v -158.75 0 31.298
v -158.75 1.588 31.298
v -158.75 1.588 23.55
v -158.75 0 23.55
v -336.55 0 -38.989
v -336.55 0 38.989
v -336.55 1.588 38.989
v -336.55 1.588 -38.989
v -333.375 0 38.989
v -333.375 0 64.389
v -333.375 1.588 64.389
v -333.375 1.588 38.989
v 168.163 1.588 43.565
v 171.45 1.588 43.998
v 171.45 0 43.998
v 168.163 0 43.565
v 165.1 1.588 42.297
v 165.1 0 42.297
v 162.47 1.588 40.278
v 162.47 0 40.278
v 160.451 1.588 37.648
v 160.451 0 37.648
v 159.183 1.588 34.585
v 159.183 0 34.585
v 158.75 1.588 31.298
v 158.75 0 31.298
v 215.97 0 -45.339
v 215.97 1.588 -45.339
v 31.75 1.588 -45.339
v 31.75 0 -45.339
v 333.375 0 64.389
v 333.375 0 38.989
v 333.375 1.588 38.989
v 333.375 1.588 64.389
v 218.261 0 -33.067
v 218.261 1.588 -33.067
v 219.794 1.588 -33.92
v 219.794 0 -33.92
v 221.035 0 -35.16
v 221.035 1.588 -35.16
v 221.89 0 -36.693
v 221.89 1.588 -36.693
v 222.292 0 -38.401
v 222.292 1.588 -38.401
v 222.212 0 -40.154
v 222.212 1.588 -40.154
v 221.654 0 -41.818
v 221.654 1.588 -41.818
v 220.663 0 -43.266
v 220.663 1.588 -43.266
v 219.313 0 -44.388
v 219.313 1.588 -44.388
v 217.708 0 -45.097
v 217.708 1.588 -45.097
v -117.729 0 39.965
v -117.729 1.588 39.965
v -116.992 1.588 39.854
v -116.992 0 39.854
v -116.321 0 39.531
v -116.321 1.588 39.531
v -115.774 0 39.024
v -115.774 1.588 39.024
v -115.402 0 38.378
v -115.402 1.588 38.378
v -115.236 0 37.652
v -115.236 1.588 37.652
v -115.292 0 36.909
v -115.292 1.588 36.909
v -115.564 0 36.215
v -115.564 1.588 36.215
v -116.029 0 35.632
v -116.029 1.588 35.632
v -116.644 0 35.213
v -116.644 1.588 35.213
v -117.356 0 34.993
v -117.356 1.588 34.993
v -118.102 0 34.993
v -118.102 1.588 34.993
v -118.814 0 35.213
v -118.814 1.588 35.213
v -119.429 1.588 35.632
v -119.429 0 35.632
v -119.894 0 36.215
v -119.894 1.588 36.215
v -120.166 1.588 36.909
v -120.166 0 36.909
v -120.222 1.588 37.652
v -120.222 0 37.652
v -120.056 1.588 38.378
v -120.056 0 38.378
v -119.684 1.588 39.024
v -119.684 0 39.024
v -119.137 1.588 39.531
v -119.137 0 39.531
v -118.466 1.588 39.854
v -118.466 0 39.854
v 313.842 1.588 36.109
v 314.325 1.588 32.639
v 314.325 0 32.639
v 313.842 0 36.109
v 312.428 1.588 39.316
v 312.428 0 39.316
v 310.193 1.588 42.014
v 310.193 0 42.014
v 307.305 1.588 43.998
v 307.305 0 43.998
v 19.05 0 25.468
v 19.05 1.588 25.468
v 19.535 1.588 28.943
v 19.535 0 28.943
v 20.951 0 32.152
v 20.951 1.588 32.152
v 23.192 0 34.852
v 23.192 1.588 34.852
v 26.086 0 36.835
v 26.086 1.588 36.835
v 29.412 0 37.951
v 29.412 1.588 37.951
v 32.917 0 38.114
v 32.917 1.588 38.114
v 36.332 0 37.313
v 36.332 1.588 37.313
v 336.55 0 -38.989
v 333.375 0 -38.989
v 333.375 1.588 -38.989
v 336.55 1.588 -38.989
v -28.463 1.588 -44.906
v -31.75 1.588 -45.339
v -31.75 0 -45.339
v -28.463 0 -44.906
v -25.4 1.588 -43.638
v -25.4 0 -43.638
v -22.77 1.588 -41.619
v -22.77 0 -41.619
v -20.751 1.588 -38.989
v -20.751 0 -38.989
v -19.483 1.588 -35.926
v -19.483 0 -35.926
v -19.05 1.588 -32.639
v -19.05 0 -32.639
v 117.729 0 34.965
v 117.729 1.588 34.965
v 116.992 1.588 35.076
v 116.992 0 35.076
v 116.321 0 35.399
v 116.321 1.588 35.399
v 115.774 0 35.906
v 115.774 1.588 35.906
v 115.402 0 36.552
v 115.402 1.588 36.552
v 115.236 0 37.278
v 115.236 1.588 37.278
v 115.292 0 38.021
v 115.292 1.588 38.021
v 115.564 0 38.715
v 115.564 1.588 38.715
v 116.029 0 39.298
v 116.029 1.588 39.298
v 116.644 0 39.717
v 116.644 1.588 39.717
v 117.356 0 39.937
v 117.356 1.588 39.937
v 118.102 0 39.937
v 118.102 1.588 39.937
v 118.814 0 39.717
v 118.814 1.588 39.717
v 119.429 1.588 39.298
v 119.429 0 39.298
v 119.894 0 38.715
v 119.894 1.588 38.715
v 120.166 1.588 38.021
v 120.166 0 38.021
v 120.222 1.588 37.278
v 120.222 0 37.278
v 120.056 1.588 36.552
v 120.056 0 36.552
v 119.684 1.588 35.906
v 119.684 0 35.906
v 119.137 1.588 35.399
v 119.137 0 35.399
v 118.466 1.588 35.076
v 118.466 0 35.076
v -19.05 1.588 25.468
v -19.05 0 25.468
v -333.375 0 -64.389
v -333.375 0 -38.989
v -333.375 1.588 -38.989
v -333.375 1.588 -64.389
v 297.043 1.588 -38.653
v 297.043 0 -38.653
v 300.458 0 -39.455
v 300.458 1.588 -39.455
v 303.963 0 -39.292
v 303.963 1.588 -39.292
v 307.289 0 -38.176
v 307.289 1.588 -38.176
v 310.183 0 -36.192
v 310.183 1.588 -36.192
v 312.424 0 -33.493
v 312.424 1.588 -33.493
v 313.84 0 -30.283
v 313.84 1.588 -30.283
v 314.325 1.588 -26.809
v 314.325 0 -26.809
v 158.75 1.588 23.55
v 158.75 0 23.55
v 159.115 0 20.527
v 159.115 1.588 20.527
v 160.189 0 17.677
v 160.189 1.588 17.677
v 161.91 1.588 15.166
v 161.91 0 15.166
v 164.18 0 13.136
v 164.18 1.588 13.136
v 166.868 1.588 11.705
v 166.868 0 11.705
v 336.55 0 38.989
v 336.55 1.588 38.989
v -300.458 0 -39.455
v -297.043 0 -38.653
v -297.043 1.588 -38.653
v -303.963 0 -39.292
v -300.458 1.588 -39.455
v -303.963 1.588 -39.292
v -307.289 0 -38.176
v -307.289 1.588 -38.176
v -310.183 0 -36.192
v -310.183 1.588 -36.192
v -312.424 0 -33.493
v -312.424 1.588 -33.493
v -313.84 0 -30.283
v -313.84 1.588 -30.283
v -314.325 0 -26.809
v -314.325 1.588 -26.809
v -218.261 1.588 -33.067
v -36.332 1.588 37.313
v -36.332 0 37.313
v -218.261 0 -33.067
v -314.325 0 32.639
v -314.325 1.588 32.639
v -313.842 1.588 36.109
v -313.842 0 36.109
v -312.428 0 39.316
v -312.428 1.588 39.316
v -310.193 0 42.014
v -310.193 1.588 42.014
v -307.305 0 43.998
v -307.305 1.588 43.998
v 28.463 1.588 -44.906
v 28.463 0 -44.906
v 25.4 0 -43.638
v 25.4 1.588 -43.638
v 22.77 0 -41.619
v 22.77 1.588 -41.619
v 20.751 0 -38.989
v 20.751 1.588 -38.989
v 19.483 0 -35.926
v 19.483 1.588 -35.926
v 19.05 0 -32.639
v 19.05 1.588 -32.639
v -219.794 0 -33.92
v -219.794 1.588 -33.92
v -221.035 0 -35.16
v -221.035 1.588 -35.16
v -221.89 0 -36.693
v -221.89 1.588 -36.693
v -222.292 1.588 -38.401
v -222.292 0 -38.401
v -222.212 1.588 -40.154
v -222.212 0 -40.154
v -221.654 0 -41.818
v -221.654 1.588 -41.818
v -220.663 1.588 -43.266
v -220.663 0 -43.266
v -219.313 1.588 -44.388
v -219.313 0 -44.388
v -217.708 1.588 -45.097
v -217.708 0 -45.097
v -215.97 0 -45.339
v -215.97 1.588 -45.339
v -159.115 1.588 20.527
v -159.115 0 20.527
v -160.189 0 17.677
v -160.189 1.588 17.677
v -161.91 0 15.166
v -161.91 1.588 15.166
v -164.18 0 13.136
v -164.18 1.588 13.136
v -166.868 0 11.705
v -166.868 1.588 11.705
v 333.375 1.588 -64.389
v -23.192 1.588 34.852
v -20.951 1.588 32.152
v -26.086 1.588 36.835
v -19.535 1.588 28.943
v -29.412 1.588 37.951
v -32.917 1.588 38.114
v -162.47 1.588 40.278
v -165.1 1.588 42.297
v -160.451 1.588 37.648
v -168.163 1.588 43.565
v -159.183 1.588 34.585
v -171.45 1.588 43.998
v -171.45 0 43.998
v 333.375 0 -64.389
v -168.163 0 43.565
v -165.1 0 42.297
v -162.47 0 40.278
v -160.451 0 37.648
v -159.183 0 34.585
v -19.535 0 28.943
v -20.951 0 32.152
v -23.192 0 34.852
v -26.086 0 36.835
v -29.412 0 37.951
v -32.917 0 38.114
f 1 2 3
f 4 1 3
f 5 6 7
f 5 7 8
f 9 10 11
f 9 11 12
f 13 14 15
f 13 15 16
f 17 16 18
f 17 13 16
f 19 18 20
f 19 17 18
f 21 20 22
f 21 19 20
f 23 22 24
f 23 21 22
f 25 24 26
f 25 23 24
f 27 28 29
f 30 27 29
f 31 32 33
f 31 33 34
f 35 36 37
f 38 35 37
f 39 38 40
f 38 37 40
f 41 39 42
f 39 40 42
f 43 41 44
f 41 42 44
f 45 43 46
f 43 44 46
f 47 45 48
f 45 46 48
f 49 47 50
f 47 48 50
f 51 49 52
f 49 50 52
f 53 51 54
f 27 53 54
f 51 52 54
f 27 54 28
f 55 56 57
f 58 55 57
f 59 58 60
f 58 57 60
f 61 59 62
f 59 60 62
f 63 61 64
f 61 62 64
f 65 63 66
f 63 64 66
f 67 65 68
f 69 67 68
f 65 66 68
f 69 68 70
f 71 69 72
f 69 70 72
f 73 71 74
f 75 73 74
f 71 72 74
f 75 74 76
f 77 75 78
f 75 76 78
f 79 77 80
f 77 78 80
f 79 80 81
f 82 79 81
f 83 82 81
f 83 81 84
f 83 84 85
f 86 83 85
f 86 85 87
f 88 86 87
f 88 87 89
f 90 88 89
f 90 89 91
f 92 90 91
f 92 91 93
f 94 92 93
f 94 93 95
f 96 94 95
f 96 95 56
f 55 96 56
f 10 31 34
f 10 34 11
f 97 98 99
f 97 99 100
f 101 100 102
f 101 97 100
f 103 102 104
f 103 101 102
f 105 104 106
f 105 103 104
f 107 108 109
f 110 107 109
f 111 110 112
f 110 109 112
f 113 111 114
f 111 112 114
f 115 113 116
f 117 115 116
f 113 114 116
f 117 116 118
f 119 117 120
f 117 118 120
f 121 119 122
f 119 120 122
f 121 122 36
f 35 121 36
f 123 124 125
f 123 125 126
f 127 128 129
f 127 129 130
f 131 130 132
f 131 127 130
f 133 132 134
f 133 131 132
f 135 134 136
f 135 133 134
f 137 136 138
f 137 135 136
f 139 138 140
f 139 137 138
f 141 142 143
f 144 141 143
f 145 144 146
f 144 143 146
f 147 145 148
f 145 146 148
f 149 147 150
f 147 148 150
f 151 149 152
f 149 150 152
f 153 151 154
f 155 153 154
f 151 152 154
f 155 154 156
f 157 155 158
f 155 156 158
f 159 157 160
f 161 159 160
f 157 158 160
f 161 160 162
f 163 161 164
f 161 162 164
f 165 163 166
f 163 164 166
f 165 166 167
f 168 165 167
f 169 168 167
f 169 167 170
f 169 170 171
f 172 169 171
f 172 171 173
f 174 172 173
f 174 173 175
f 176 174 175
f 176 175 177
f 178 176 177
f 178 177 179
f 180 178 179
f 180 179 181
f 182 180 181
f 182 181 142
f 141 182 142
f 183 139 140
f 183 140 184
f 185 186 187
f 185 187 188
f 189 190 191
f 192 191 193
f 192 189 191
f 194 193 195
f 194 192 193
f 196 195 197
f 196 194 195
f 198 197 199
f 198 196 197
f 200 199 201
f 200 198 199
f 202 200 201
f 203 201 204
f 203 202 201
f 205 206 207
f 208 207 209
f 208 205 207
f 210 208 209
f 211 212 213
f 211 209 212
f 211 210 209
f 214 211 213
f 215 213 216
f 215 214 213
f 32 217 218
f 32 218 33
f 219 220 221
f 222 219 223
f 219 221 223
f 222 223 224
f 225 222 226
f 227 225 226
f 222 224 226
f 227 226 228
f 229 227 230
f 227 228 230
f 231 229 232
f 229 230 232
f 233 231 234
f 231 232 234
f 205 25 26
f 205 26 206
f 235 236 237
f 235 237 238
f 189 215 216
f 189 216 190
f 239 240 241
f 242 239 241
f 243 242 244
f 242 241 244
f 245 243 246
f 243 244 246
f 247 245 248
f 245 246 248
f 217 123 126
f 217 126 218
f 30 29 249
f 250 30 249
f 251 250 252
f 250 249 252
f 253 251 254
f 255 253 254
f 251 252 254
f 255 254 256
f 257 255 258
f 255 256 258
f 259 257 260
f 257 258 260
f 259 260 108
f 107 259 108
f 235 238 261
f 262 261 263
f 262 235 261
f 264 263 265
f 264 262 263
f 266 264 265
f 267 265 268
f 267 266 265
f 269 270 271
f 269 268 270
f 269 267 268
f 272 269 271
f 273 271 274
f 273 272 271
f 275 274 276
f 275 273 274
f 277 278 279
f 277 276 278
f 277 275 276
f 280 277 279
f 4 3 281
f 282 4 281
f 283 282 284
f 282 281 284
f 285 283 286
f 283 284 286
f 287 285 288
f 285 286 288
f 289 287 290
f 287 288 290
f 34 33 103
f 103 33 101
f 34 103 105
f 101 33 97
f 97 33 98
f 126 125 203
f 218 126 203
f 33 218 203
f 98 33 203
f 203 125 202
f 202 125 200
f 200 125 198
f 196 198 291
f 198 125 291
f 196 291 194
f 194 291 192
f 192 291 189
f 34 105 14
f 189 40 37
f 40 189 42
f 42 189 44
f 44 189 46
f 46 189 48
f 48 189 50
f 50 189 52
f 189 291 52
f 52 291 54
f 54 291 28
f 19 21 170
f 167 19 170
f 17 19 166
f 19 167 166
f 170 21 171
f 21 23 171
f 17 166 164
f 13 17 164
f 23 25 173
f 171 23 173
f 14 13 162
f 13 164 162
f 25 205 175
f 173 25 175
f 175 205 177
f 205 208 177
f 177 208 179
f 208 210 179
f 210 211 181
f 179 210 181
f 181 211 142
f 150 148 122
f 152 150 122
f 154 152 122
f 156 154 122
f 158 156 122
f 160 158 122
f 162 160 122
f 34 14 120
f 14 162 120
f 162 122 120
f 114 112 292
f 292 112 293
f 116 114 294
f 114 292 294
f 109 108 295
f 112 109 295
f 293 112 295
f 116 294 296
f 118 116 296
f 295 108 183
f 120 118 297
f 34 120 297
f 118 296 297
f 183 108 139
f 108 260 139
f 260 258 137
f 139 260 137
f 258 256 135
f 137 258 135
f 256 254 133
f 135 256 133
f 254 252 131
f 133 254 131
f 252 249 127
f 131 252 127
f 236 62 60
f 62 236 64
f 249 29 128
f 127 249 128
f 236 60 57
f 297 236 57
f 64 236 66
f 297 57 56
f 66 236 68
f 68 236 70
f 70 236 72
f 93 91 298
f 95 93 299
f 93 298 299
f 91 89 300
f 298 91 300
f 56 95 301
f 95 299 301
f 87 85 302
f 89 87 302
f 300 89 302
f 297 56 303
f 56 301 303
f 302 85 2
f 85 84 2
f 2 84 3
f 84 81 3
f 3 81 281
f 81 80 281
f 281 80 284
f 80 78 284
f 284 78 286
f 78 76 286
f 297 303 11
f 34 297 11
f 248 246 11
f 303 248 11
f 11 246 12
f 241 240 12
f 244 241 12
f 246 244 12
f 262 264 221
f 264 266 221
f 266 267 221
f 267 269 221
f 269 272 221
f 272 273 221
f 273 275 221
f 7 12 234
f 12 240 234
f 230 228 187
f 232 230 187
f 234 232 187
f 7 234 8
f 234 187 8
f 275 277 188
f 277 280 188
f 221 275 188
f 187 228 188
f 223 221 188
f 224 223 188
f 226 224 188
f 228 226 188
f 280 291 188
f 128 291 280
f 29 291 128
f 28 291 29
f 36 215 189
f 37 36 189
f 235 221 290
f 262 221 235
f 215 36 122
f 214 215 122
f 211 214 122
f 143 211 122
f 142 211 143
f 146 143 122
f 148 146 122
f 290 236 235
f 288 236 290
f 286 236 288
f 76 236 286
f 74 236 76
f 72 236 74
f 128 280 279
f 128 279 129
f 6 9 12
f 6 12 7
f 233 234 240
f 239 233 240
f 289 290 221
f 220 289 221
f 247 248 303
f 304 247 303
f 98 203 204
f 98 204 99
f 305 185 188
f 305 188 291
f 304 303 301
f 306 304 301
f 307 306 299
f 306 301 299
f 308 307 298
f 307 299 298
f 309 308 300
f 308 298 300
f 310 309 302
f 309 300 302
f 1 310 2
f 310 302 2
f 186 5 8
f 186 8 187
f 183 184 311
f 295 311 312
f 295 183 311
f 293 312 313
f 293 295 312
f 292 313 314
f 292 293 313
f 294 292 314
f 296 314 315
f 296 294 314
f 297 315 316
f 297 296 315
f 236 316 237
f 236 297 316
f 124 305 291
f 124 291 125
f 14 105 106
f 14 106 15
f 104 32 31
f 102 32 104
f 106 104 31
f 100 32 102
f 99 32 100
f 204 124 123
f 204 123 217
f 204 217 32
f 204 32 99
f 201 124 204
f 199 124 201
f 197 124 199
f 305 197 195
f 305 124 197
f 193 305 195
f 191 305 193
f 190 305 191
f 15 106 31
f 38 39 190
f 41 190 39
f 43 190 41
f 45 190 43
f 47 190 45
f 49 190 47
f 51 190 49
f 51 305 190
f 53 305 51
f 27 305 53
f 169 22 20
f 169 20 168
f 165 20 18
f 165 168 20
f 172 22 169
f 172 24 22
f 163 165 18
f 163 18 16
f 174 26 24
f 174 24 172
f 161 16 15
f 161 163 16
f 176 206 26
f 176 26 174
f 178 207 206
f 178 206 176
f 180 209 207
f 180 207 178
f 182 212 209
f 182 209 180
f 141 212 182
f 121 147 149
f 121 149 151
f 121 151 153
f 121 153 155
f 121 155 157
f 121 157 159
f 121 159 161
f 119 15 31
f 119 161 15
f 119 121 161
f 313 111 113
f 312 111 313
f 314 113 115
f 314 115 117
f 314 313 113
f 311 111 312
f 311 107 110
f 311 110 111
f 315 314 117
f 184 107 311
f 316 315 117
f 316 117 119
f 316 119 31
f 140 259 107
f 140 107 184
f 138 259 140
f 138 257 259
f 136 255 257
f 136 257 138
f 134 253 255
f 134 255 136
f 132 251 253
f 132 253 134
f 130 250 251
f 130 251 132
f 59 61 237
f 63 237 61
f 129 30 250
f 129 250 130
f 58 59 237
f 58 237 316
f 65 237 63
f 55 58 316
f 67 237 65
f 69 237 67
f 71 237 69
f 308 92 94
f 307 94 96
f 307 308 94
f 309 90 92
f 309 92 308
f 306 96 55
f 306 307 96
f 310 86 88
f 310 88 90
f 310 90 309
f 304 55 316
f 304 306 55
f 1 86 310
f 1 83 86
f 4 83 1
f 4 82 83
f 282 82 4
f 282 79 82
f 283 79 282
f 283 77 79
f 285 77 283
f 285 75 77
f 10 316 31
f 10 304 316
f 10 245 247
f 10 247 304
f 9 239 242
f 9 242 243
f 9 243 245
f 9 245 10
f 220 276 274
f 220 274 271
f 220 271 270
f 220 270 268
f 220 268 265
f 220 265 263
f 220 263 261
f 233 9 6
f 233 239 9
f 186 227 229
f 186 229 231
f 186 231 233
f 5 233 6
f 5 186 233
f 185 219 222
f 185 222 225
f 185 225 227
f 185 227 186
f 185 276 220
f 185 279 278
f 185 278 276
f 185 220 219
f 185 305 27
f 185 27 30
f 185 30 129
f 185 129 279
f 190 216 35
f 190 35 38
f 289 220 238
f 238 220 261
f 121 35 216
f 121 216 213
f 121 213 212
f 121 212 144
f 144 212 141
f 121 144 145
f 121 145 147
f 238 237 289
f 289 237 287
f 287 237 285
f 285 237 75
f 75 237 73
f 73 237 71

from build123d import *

# Parameters (mm, degrees)
BOSS_EXTRUDE1_DEPTH = 1.5875
CUT_EXTRUDE2_DEPTH  = 343.657797193
SKETCH4_R           = 2.5
CUT_EXTRUDE3_DEPTH  = 343.657797193


with BuildPart() as part:
    # Sketch1 → Boss-Extrude1 (new body)
    with BuildSketch(Plane(origin=(0, 0, 0), x_dir=(1, 0, 0), z_dir=(0, 1, 0))):
        Polygon((-333.375, 38.989), (-333.375, 64.389), (333.375, 64.389), (333.375, 38.989), (336.55, 38.989), (336.55, -38.989), (333.375, -38.989), (333.375, -64.389), (-333.375, -64.389), (-333.375, -38.989), (-336.55, -38.989), (-336.55, 38.989), align=None)
    extrude(amount=BOSS_EXTRUDE1_DEPTH)

    # Sketch3 → Cut-Extrude2 (cut, through all)
    with BuildSketch(Plane(origin=(0, 1.5875, 0), x_dir=(1, 0, 0), z_dir=(0, 1, 0))):
        with BuildLine():
            Line((-314.325, 26.808799864), (-314.325, -32.639))
            ThreePointArc((-314.325, -32.639), (-312.428265266, -39.315785124), (-307.304612663, -43.998225326))
            Line((-307.304612663, -43.998225326), (-171.45, -43.998225326))
            ThreePointArc((-171.45, -43.998225326), (-162.469743879, -40.278481447), (-158.75, -31.298225326))
            Line((-158.75, -31.298225326), (-158.75, -23.549607936))
            ThreePointArc((-158.75, -23.549607936), (-160.974250295, -16.369867821), (-166.867900491, -11.705015748))
            Line((-166.867900491, -11.705015748), (-297.042900491, 38.653392051))
            ThreePointArc((-297.042900491, 38.653392051), (-308.804740115, 37.284549569), (-314.325, 26.808799864))
        make_face()
        with BuildLine():
            Line((-215.969521054, 45.339), (-31.75, 45.339))
            ThreePointArc((-31.75, 45.339), (-22.769743879, 41.619256121), (-19.05, 32.639))
            Line((-19.05, 32.639), (-19.05, -25.46802519))
            ThreePointArc((-19.05, -25.46802519), (-24.570259885, -35.943774895), (-36.332099509, -37.312617377))
            Line((-36.332099509, -37.312617377), (-218.260570808, 33.066703906))
            ThreePointArc((-218.260570808, 33.066703906), (-222.211679342, 40.154315366), (-215.969521054, 45.339))
        make_face()
        with BuildLine():
            Line((36.332099509, -37.312617377), (218.260570808, 33.066703906))
            ThreePointArc((218.260570808, 33.066703906), (222.211679342, 40.154315366), (215.969521054, 45.339))
            Line((215.969521054, 45.339), (31.75, 45.339))
            ThreePointArc((31.75, 45.339), (22.769743879, 41.619256121), (19.05, 32.639))
            Line((19.05, 32.639), (19.05, -25.46802519))
            ThreePointArc((19.05, -25.46802519), (24.570259885, -35.943774895), (36.332099509, -37.312617377))
        make_face()
        with BuildLine():
            Line((314.325, 26.808799864), (314.325, -32.639))
            ThreePointArc((314.325, -32.639), (312.428265266, -39.315785124), (307.304612663, -43.998225326))
            Line((307.304612663, -43.998225326), (171.45, -43.998225326))
            ThreePointArc((171.45, -43.998225326), (162.469743879, -40.278481447), (158.75, -31.298225326))
            Line((158.75, -31.298225326), (158.75, -23.549607936))
            ThreePointArc((158.75, -23.549607936), (160.974250295, -16.369867821), (166.867900491, -11.705015748))
            Line((166.867900491, -11.705015748), (297.042900491, 38.653392051))
            ThreePointArc((297.042900491, 38.653392051), (308.804740115, 37.284549569), (314.325, 26.808799864))
        make_face()
    extrude(amount=-CUT_EXTRUDE2_DEPTH, mode=Mode.SUBTRACT)

    # Sketch4 → Cut-Extrude3 (cut, through all)
    with BuildSketch(Plane(origin=(0, 1.5875, 0), x_dir=(1, 0, 0), z_dir=(0, 1, 0))):
        with Locations(Location((-117.729, -37.465, 0), (0, 0, 270))):
            Circle(SKETCH4_R)
        with Locations(Location((117.729, -37.465, 0), (0, 0, 90))):
            Circle(SKETCH4_R)
    extrude(amount=-CUT_EXTRUDE3_DEPTH, mode=Mode.SUBTRACT)


solid = part.part
